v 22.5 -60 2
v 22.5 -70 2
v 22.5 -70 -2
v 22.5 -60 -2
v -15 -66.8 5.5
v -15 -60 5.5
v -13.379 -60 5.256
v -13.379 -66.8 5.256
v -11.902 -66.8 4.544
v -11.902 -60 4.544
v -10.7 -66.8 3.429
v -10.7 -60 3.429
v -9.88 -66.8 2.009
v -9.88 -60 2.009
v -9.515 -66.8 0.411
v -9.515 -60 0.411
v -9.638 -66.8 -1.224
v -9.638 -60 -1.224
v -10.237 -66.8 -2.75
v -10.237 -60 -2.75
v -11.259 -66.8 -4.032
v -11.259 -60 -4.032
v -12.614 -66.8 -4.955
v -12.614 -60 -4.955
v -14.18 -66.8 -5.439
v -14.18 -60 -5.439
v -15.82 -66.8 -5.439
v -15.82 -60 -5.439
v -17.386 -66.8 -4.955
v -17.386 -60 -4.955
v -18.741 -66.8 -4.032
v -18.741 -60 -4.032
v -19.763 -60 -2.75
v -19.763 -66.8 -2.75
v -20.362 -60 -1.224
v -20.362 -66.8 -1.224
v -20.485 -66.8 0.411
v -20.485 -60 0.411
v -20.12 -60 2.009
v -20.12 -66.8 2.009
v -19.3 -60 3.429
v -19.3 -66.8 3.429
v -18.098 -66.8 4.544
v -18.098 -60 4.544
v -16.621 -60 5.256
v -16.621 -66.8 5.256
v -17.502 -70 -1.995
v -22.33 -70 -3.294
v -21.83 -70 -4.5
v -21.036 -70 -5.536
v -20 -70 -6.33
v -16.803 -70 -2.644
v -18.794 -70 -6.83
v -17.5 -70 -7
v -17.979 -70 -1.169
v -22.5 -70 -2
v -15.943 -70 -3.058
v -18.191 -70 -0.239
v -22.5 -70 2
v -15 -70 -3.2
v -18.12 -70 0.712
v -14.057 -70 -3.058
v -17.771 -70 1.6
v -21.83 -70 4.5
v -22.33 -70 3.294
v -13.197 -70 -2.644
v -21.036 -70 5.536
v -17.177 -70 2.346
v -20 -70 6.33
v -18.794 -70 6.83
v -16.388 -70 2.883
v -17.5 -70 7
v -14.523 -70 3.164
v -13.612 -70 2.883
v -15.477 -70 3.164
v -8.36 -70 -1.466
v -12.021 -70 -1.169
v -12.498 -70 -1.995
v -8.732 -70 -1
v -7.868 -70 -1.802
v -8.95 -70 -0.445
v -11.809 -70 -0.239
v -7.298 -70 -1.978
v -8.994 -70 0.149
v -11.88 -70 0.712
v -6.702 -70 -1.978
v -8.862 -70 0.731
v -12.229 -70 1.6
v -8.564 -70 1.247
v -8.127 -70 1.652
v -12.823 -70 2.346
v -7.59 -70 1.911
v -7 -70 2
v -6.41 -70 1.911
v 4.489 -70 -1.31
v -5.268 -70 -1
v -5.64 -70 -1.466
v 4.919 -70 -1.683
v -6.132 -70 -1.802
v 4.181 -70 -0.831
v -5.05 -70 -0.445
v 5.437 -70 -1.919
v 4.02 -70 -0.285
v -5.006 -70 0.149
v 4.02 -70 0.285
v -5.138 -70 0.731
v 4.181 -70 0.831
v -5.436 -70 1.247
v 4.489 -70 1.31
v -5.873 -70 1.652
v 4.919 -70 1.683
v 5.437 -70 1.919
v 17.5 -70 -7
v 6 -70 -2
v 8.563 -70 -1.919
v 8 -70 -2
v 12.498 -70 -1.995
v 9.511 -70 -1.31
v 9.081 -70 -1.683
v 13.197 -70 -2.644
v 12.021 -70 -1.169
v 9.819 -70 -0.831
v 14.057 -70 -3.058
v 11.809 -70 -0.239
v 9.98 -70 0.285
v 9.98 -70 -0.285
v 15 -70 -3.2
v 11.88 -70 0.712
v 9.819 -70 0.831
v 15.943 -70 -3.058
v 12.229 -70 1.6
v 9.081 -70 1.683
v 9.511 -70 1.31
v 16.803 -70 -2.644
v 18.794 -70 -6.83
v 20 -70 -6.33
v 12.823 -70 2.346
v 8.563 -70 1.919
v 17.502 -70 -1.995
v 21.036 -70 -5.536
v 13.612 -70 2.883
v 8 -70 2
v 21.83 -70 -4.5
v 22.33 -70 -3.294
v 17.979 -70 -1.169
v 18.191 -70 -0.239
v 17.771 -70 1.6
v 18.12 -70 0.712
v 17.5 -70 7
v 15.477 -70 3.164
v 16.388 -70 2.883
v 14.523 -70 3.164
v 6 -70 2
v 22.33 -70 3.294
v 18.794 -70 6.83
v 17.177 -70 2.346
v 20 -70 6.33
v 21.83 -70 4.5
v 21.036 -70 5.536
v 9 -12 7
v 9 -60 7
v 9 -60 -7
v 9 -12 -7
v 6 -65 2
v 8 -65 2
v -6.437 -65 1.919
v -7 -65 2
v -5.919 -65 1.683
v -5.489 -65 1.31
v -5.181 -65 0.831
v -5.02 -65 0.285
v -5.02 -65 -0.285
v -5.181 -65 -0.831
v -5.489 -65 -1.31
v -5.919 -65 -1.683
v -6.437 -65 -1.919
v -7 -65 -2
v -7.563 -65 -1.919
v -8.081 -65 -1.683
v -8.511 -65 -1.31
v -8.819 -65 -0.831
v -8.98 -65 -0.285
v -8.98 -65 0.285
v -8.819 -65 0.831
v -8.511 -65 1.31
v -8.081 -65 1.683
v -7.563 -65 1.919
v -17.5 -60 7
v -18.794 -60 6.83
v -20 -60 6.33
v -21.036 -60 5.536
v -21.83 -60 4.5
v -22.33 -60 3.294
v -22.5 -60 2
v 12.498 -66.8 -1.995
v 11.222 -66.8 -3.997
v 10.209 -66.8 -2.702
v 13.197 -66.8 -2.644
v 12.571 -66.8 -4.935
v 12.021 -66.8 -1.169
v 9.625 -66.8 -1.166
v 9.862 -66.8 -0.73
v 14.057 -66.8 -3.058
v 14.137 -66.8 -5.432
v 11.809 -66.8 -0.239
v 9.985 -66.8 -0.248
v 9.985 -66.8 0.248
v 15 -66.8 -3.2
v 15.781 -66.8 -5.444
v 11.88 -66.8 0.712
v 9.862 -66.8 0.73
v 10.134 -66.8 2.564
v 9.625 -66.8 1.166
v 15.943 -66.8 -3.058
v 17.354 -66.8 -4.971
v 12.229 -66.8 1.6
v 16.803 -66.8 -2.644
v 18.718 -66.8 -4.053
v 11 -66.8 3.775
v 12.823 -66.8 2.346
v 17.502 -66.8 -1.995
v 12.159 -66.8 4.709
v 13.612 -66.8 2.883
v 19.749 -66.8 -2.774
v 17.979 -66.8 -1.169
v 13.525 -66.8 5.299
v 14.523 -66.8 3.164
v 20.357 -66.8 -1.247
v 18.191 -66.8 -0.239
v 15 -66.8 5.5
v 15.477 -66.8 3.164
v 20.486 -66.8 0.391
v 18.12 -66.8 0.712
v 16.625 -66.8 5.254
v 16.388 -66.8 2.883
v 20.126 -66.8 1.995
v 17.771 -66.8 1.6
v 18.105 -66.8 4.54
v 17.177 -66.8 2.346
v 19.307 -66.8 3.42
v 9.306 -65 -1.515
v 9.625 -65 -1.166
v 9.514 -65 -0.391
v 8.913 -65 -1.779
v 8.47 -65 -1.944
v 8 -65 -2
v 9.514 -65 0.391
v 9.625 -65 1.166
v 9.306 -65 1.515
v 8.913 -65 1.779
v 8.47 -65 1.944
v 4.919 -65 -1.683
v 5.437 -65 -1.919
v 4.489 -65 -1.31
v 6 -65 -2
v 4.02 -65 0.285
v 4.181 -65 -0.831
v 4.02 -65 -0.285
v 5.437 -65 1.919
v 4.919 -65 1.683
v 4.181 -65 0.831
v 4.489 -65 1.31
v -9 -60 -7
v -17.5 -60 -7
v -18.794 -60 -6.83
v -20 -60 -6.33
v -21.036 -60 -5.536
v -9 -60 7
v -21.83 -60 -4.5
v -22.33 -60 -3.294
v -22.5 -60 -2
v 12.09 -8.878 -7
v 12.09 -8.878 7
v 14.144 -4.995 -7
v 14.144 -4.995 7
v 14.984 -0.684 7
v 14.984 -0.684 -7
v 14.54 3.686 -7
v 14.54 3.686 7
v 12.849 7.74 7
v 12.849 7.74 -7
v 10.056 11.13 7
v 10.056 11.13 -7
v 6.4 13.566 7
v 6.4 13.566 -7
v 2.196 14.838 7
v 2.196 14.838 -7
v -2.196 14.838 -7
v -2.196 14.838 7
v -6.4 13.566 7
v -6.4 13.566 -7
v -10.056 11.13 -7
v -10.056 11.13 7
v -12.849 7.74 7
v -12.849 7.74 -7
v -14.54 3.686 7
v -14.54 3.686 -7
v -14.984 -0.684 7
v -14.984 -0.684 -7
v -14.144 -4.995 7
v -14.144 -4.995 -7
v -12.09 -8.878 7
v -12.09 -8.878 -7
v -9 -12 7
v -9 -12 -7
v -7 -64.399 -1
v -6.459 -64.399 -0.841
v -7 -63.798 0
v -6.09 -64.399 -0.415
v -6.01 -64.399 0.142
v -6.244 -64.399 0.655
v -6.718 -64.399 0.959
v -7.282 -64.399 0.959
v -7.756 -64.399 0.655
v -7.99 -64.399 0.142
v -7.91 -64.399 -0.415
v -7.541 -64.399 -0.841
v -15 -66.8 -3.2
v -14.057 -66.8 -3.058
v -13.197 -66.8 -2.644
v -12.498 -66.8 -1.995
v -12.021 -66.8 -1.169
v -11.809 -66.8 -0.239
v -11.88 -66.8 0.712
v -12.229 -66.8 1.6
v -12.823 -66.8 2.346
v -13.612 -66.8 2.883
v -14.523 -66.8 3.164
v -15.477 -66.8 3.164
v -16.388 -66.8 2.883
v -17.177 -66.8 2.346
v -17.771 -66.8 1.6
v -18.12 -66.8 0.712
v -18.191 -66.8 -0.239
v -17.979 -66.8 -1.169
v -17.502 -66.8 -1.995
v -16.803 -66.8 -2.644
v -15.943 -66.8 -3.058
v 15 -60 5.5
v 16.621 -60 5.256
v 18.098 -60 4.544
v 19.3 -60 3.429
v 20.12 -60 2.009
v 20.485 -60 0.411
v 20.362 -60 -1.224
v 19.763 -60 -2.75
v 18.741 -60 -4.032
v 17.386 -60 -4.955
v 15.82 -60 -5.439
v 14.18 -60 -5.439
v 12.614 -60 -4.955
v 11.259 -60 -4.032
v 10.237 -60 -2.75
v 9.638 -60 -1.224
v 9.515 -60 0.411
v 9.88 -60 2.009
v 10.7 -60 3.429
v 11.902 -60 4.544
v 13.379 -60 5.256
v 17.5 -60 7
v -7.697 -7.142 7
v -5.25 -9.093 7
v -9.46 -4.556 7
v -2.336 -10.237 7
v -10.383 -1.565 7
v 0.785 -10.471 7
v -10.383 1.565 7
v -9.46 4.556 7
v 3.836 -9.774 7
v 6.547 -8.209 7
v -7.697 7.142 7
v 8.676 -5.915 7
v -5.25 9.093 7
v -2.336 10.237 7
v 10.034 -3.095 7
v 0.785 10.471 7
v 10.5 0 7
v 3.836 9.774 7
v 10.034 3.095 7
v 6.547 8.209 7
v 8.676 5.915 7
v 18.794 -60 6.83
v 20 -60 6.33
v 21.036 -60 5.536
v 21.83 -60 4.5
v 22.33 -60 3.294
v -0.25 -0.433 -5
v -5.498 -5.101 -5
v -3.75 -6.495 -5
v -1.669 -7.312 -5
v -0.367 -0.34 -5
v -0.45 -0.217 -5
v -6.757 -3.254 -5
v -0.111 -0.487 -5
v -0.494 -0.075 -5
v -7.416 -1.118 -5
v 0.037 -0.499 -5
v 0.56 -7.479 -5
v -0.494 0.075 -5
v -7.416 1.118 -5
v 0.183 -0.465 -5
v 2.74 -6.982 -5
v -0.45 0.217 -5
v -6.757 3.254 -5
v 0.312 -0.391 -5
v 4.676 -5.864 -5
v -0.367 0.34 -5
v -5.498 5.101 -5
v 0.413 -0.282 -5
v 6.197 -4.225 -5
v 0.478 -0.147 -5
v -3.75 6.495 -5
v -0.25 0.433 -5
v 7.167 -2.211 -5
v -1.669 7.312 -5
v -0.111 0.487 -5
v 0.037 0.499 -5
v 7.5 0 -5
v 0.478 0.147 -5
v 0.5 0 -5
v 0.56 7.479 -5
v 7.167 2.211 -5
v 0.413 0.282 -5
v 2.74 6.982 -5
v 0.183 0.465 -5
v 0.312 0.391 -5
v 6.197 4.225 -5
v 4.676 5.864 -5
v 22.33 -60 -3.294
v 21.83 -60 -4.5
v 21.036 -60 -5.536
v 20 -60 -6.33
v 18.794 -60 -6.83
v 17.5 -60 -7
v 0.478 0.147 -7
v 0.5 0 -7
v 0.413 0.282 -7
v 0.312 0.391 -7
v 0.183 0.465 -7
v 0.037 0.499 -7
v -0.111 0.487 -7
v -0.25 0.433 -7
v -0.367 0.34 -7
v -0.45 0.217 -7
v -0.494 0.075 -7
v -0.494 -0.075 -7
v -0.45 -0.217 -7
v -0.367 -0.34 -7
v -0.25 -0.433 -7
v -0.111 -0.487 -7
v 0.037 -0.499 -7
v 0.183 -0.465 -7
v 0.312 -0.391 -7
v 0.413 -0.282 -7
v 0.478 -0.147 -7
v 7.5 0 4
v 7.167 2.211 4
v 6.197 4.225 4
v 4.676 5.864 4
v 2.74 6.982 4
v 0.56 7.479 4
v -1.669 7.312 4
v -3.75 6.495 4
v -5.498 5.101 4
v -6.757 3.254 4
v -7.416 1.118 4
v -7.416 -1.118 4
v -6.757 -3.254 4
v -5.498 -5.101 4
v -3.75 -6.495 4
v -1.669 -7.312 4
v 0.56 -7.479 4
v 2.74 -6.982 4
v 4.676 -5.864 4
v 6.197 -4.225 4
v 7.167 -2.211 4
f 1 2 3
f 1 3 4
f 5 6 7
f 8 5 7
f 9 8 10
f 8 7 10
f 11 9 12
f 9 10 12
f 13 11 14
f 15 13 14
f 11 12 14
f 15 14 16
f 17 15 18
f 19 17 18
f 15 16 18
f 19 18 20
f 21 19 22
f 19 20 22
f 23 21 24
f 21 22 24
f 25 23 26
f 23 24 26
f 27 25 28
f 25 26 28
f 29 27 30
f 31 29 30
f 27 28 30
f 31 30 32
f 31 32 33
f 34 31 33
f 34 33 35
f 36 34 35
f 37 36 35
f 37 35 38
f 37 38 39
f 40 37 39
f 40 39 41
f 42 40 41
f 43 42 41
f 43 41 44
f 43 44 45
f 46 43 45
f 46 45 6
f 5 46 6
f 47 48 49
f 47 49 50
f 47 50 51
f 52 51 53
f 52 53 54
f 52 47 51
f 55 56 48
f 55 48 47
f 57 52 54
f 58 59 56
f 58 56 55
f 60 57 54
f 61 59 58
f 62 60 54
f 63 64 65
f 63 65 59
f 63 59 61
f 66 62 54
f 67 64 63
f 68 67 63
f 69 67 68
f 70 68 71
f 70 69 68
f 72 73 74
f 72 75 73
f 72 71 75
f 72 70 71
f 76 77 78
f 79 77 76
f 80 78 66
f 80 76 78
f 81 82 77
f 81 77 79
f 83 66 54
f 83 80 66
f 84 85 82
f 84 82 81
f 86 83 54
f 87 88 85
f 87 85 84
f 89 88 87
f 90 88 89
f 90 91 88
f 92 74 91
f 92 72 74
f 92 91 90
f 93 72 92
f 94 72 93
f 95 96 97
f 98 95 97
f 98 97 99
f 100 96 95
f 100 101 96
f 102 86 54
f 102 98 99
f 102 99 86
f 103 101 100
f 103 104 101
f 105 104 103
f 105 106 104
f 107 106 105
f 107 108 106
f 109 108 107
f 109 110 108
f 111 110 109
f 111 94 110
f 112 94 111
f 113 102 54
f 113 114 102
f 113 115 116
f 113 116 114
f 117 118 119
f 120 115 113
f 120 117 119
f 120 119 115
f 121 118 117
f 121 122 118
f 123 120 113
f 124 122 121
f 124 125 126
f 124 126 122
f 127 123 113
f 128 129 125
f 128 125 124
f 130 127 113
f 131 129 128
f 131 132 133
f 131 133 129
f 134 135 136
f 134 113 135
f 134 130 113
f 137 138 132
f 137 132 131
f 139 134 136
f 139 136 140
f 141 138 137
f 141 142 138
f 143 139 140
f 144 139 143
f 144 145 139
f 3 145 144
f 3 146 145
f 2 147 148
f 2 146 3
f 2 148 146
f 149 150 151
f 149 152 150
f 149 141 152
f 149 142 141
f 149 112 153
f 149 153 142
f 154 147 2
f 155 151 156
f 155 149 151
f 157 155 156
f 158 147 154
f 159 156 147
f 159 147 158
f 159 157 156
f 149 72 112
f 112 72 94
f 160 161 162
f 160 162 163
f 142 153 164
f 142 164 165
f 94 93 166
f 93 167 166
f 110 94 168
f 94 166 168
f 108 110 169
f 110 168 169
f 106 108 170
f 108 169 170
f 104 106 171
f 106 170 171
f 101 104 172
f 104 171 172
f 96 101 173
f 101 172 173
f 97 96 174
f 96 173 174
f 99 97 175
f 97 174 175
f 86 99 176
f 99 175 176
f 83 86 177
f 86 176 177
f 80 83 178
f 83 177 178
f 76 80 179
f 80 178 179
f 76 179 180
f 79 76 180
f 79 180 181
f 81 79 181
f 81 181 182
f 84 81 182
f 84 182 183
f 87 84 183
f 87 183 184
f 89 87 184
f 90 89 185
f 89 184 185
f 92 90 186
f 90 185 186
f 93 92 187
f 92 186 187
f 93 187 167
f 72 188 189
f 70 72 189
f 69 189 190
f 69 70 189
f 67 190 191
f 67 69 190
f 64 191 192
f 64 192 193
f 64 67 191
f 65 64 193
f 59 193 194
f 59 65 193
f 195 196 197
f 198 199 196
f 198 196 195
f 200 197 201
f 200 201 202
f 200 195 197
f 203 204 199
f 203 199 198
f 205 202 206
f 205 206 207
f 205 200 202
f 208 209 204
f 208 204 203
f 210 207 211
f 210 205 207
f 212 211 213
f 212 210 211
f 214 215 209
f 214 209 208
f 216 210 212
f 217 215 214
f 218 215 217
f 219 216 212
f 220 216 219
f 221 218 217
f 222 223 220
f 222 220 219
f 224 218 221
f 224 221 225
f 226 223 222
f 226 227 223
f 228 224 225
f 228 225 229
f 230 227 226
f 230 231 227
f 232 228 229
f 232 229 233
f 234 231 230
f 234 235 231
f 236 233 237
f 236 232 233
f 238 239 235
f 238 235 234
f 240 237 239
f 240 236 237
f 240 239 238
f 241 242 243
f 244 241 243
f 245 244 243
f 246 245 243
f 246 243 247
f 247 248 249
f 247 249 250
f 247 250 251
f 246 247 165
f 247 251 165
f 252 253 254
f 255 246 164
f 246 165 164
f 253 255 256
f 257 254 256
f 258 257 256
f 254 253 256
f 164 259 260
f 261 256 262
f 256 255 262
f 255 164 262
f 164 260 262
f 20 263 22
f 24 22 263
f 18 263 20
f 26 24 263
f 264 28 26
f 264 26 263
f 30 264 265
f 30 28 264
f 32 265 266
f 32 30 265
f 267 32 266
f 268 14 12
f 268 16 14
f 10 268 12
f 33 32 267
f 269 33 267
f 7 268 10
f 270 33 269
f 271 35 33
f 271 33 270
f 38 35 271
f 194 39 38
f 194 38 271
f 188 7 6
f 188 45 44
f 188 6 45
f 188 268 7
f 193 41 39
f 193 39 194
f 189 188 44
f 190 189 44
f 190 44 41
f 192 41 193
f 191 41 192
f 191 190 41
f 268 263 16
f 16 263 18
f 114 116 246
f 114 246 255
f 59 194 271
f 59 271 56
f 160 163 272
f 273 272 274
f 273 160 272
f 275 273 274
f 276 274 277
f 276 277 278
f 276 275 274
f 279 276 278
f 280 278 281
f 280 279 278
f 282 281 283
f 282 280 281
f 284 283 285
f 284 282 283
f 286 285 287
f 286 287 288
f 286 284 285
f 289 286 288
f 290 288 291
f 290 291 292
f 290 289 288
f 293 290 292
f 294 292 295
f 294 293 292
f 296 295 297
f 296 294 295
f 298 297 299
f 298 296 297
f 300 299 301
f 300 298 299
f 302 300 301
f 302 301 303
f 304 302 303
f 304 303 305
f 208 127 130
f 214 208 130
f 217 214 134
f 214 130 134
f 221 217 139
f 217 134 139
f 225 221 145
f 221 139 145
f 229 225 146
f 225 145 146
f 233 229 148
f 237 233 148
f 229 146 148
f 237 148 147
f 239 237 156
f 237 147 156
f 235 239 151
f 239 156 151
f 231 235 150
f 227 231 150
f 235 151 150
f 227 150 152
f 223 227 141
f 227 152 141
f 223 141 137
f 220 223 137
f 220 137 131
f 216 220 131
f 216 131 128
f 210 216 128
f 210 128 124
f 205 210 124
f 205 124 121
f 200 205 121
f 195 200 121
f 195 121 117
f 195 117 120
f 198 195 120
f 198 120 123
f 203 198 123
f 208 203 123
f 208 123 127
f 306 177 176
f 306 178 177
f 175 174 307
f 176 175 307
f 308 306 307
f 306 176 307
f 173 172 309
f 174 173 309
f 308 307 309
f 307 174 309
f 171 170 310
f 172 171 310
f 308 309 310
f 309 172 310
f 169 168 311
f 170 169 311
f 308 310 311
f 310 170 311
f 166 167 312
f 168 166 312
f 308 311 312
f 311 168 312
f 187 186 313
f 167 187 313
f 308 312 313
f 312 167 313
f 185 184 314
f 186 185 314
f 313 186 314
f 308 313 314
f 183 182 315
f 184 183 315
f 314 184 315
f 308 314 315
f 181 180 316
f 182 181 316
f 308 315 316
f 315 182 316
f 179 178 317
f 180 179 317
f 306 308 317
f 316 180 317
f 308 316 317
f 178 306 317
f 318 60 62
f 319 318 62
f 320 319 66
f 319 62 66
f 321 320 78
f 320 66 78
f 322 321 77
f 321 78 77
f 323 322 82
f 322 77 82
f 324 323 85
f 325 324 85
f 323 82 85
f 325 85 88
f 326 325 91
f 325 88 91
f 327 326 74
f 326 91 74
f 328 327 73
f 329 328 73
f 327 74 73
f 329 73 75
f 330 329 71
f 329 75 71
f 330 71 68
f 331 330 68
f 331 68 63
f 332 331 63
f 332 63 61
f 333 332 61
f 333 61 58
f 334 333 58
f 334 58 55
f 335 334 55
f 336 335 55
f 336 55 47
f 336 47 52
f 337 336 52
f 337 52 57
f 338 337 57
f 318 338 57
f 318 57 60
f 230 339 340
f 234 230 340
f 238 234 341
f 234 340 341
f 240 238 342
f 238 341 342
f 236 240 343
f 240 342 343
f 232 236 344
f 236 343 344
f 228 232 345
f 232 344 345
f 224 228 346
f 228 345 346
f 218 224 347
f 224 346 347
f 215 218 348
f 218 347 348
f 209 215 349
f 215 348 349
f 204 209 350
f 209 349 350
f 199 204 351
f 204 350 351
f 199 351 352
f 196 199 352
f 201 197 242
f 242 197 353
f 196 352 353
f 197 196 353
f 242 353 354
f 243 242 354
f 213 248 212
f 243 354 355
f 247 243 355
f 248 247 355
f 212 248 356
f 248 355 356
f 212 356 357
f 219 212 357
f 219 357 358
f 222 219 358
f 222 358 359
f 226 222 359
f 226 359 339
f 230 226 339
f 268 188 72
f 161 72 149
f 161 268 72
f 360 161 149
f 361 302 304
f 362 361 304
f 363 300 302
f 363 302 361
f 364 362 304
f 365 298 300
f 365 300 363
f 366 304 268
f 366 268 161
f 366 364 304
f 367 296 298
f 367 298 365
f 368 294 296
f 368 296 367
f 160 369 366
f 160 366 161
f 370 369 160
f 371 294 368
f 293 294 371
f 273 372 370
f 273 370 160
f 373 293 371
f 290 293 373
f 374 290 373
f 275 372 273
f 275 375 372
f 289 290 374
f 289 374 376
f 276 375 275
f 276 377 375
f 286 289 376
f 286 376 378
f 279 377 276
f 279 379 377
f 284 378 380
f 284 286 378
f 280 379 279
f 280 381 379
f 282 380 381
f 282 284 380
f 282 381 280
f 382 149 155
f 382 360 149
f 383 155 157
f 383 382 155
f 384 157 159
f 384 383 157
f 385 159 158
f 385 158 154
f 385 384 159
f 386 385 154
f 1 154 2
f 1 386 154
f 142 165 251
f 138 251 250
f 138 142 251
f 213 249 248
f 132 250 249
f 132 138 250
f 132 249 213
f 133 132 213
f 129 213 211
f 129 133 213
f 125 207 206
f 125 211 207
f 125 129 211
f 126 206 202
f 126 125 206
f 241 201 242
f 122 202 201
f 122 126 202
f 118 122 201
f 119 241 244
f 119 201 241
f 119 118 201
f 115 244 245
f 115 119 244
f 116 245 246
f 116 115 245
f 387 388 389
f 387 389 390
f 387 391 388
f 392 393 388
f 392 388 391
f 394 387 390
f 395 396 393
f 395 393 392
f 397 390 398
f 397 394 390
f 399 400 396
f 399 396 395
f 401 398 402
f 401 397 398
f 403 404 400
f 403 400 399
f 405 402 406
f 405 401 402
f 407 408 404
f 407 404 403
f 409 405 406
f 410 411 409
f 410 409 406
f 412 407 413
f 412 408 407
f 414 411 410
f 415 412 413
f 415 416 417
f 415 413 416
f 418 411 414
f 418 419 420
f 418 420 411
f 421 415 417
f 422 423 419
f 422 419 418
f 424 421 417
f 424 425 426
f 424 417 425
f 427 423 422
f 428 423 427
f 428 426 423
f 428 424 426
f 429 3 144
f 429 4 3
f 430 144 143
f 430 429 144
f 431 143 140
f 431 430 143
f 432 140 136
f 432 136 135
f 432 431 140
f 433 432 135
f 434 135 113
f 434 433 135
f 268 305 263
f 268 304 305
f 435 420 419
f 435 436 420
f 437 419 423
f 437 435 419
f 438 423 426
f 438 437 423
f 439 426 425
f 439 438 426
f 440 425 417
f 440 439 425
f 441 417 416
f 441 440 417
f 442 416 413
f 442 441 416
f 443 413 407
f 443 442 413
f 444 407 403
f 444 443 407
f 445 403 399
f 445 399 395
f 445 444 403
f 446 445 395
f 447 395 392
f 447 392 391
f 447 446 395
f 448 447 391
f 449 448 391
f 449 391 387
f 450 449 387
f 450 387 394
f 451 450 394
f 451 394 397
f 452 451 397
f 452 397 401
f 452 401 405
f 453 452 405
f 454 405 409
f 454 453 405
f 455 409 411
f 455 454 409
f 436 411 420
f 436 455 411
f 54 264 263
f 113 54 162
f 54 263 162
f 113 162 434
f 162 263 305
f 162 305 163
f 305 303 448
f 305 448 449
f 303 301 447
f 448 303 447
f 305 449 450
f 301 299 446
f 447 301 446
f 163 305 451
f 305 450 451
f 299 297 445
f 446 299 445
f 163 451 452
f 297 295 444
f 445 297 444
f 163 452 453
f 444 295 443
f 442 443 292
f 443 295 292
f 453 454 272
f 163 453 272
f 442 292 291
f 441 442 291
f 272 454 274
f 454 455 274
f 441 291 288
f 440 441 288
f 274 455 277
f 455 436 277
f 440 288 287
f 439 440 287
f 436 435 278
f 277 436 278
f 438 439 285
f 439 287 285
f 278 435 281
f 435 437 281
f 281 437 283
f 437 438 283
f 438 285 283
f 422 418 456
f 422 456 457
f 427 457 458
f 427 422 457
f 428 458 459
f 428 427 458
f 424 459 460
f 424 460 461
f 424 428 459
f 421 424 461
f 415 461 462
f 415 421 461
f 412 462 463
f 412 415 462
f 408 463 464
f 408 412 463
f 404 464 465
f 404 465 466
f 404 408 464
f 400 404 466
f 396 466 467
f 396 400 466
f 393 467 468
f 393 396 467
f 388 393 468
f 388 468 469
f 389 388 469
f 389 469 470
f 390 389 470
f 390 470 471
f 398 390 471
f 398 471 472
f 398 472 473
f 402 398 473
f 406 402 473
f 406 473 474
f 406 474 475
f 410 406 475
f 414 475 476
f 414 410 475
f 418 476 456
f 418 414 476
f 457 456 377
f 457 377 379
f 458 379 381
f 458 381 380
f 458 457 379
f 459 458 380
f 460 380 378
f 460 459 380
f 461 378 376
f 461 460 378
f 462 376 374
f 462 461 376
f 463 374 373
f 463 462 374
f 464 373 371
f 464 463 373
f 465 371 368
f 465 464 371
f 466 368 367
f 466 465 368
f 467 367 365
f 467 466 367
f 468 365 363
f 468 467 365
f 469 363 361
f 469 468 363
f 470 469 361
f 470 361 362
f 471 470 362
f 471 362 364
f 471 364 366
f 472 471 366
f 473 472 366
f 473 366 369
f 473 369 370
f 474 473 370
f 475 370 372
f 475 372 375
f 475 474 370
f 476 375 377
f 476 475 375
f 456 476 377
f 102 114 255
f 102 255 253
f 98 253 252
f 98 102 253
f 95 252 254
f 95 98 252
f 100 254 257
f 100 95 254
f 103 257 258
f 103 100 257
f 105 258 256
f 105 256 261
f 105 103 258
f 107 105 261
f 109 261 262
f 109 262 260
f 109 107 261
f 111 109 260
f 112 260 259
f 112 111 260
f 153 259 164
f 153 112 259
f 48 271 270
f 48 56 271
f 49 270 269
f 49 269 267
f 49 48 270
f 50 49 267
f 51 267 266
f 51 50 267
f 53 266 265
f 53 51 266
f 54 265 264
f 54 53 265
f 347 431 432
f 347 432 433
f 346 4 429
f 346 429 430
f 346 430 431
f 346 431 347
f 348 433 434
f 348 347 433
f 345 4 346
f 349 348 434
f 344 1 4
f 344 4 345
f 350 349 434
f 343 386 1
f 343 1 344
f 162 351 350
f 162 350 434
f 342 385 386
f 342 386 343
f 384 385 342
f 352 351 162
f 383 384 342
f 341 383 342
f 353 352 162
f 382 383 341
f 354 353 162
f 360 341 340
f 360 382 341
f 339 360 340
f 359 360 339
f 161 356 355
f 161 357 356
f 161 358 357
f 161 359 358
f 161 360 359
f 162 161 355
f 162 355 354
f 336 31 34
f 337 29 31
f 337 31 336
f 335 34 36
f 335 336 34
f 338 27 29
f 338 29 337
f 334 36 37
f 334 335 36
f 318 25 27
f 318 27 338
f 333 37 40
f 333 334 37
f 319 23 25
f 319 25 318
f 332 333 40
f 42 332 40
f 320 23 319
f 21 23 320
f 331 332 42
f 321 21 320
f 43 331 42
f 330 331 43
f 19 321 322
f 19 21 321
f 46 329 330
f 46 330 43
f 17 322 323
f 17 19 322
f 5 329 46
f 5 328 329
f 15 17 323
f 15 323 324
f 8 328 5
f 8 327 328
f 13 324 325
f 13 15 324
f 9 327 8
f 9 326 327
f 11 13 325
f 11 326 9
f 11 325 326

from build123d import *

# Parameters (mm, degrees)
SKETCH_1_R                = 15
SKETCH_1_R_2              = 0.5
EXTRUDE_1_DEPTH           = 7
CUT_EXTRUDE_START         = -12
SKETCH_2_R                = 7.5
SKETCH_2_R_2              = 0.5
CUT_EXTRUDE_1_DEPTH       = 12
CHAMFER_1_SIZE            = 3
EXTRUDE_2_DEPTH           = 7
CUT_EXTRUDE_2_DEPTH       = 5
FILLET_1_R                = 5
MM_1_D                    = 4
MM_1_DEPTH                = 5
MM_1_TIP                  = 1.201721238
HOLE_WIZARD_1_D           = 6.4
HOLE_WIZARD_1_DEPTH       = 10
HOLE_WIZARD_1_CBORE_D     = 11
HOLE_WIZARD_1_CBORE_DEPTH = 6.8


with BuildPart() as part:
    # 草图1 → 凸台-拉伸1 (new, symmetric)
    with BuildSketch(Plane.XY):
        Circle(SKETCH_1_R)
        Circle(SKETCH_1_R_2, mode=Mode.SUBTRACT)
    extrude(amount=EXTRUDE_1_DEPTH, both=True)

    # 草图2 → 切除-拉伸1 (cut)
    with BuildSketch(Plane.XY.offset(7).offset(CUT_EXTRUDE_START)):
        Circle(SKETCH_2_R)
        Circle(SKETCH_2_R_2, mode=Mode.SUBTRACT)
    extrude(amount=CUT_EXTRUDE_1_DEPTH, mode=Mode.SUBTRACT)

    # 倒角1
    chamfer_1_edges = [part.edges().sort_by_distance(p)[0] for p in [
        (-7.5, 0, 7),
    ]]
    chamfer(chamfer_1_edges, length=CHAMFER_1_SIZE)

    # 草图3 → 凸台-拉伸2 (add, symmetric)
    with BuildSketch(Plane.XY):
        with BuildLine():
            Line((-22.5, -60), (-22.5, -70))
            Line((-22.5, -70), (22.5, -70))
            Line((22.5, -70), (22.5, -60))
            Line((22.5, -60), (9, -60))
            Line((9, -60), (9, -12))
            ThreePointArc((9, -12), (0, -15), (-9, -12))
            Line((-9, -12), (-9, -60))
            Line((-9, -60), (-22.5, -60))
        make_face()
    extrude(amount=EXTRUDE_2_DEPTH, both=True)

    # 草图4 → 切除-拉伸2 (cut)
    with BuildSketch(Plane.XZ.offset(70)):
        with BuildLine():
            Line((6, 2), (8, 2))
            ThreePointArc((8, 2), (10, 0), (8, -2))
            Line((8, -2), (6, -2))
            ThreePointArc((6, -2), (4, 0), (6, 2))
        make_face()
    extrude(amount=-CUT_EXTRUDE_2_DEPTH, mode=Mode.SUBTRACT)

    # 圆角1
    fillet_1_edges = [part.edges().sort_by_distance(p)[0] for p in [
        (-22.5, -65, -7),
        (22.5, -65, 7),
        (-22.5, -65, 7),
        (22.5, -65, -7),
    ]]
    fillet(fillet_1_edges, radius=FILLET_1_R)

    # 大小mm 暗销孔1
    with Locations(Plane(origin=(-7, -70, 0), x_dir=(0, 0, -1), z_dir=(0, -1, 0))):
        with Locations((0, 0)):
            Hole(MM_1_D / 2, depth=MM_1_DEPTH)
            with Locations((0, 0, -(MM_1_DEPTH + MM_1_TIP / 2))):  # 118° drill point
                Cone(0, MM_1_D / 2, MM_1_TIP, mode=Mode.SUBTRACT)

    # 打孔尺寸(%根据)内六角圆柱头螺钉的类型1
    with Locations(Plane(origin=(-15, -60, 0), x_dir=(0, 0, 1), z_dir=(0, 1, 0))):
        with Locations((0, 0), (0, 30)):
            CounterBoreHole(HOLE_WIZARD_1_D / 2, HOLE_WIZARD_1_CBORE_D / 2, HOLE_WIZARD_1_CBORE_DEPTH, depth=HOLE_WIZARD_1_DEPTH)


solid = part.part
